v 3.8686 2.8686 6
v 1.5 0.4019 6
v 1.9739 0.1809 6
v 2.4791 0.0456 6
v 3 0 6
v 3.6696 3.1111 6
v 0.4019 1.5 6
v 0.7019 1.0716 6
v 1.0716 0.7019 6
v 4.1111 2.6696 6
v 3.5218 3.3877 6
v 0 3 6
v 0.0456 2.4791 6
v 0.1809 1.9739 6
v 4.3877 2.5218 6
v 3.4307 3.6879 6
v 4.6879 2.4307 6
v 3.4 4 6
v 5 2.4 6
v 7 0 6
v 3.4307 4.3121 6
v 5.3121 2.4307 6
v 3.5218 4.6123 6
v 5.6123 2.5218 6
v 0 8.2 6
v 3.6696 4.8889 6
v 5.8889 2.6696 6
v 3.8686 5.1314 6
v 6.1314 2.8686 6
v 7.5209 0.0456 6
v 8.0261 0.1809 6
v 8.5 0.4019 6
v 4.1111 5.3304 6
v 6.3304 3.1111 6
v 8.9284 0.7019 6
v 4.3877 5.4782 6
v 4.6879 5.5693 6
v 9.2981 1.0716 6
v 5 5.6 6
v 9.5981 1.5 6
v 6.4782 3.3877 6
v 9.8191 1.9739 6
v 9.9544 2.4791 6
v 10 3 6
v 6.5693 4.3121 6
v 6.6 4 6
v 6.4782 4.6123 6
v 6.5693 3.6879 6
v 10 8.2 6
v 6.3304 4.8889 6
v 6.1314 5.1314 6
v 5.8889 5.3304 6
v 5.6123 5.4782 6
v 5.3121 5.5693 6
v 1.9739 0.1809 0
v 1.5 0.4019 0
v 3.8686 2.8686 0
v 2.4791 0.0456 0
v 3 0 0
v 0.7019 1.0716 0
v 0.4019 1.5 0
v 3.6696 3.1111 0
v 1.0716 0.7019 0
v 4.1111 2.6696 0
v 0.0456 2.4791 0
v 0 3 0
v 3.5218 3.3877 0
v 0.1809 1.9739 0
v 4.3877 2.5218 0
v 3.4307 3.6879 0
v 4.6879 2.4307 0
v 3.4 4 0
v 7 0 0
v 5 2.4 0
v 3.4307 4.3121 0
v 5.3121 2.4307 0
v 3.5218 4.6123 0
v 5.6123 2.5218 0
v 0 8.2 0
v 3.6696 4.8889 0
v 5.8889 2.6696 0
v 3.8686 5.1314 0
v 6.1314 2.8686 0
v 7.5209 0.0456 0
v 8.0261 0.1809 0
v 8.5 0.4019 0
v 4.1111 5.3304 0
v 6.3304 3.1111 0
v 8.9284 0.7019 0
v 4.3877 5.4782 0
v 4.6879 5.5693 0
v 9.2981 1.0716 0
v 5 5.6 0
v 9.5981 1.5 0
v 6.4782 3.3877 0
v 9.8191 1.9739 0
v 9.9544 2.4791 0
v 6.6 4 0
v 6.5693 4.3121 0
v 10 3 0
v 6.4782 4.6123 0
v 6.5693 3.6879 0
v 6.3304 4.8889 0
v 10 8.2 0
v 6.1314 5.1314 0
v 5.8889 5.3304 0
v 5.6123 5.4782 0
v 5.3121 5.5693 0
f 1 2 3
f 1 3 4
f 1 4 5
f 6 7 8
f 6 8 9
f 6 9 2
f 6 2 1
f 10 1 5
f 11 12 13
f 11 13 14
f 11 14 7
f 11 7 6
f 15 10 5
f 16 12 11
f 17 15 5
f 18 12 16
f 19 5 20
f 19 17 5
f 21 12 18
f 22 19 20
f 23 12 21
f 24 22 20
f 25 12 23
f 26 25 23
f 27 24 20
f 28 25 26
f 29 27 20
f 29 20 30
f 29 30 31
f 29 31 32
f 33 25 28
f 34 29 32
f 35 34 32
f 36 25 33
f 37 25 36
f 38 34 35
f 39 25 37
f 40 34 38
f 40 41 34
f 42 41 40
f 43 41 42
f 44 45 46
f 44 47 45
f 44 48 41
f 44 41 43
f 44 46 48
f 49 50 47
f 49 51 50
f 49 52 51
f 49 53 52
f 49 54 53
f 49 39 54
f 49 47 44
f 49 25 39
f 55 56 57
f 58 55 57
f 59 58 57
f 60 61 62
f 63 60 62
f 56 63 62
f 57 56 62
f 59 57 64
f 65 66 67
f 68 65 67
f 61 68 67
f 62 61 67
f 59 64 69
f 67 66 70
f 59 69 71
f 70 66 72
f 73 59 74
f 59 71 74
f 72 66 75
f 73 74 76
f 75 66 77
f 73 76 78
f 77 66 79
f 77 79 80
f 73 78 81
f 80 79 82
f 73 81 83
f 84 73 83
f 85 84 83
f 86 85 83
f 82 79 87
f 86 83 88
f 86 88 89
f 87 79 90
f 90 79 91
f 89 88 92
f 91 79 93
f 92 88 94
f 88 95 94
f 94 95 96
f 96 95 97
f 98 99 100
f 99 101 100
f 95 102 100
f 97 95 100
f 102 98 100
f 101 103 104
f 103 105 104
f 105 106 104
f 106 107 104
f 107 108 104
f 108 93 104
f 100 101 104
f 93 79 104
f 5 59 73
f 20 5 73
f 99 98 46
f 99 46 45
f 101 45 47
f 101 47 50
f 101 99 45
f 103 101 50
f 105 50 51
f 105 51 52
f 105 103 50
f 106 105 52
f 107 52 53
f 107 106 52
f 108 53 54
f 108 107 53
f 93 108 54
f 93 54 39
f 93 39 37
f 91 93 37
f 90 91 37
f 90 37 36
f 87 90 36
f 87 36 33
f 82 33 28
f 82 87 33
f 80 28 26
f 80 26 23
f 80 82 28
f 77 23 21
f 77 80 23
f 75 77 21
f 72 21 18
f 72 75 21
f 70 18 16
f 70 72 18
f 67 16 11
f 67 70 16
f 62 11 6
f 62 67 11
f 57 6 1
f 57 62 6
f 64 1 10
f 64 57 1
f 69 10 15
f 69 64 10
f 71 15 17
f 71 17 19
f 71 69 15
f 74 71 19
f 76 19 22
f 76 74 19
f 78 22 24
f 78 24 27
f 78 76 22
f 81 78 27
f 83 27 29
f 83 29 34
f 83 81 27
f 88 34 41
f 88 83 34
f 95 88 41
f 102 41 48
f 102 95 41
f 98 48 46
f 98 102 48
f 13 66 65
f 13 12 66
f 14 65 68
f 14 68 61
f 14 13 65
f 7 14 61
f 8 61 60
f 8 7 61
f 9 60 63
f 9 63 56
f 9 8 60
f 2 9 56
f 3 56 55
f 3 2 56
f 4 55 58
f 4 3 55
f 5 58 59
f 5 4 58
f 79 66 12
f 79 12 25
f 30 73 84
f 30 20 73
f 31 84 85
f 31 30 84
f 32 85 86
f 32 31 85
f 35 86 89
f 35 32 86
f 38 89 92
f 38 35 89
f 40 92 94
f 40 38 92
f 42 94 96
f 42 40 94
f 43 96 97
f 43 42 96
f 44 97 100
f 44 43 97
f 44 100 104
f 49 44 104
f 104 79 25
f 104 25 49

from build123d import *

# Parameters (mm, degrees)
CYLINDER_R     = 1.6
CYLINDER_DEPTH = 6
BOX_W          = 10
BOX_H          = 8.2
BOX_DEPTH      = 6
FILLET_R       = 3


with BuildPart() as clampcilinder:
    # Cylinder → Cylinder (new body)
    with BuildSketch(Plane(origin=(5, 4, 0), x_dir=(1, 0, 0), z_dir=(0, 0, 1))):
        Circle(CYLINDER_R)
    extrude(amount=CYLINDER_DEPTH)


with BuildPart() as clampfillet:
    # Box → Box (new body)
    with BuildSketch(Plane.XY):
        with Locations((5, 4.1)):
            Rectangle(BOX_W, BOX_H)
    extrude(amount=BOX_DEPTH)

    # Cut: cut ClampCilinder
    add(clampcilinder.part, mode=Mode.SUBTRACT)

    # Fillet
    fillet_edges = [clampfillet.edges().sort_by_distance(p)[0] for p in [
        (0, 0, 3),
        (10, 0, 3),
    ]]
    fillet(fillet_edges, radius=FILLET_R)


solid = clampfillet.part
